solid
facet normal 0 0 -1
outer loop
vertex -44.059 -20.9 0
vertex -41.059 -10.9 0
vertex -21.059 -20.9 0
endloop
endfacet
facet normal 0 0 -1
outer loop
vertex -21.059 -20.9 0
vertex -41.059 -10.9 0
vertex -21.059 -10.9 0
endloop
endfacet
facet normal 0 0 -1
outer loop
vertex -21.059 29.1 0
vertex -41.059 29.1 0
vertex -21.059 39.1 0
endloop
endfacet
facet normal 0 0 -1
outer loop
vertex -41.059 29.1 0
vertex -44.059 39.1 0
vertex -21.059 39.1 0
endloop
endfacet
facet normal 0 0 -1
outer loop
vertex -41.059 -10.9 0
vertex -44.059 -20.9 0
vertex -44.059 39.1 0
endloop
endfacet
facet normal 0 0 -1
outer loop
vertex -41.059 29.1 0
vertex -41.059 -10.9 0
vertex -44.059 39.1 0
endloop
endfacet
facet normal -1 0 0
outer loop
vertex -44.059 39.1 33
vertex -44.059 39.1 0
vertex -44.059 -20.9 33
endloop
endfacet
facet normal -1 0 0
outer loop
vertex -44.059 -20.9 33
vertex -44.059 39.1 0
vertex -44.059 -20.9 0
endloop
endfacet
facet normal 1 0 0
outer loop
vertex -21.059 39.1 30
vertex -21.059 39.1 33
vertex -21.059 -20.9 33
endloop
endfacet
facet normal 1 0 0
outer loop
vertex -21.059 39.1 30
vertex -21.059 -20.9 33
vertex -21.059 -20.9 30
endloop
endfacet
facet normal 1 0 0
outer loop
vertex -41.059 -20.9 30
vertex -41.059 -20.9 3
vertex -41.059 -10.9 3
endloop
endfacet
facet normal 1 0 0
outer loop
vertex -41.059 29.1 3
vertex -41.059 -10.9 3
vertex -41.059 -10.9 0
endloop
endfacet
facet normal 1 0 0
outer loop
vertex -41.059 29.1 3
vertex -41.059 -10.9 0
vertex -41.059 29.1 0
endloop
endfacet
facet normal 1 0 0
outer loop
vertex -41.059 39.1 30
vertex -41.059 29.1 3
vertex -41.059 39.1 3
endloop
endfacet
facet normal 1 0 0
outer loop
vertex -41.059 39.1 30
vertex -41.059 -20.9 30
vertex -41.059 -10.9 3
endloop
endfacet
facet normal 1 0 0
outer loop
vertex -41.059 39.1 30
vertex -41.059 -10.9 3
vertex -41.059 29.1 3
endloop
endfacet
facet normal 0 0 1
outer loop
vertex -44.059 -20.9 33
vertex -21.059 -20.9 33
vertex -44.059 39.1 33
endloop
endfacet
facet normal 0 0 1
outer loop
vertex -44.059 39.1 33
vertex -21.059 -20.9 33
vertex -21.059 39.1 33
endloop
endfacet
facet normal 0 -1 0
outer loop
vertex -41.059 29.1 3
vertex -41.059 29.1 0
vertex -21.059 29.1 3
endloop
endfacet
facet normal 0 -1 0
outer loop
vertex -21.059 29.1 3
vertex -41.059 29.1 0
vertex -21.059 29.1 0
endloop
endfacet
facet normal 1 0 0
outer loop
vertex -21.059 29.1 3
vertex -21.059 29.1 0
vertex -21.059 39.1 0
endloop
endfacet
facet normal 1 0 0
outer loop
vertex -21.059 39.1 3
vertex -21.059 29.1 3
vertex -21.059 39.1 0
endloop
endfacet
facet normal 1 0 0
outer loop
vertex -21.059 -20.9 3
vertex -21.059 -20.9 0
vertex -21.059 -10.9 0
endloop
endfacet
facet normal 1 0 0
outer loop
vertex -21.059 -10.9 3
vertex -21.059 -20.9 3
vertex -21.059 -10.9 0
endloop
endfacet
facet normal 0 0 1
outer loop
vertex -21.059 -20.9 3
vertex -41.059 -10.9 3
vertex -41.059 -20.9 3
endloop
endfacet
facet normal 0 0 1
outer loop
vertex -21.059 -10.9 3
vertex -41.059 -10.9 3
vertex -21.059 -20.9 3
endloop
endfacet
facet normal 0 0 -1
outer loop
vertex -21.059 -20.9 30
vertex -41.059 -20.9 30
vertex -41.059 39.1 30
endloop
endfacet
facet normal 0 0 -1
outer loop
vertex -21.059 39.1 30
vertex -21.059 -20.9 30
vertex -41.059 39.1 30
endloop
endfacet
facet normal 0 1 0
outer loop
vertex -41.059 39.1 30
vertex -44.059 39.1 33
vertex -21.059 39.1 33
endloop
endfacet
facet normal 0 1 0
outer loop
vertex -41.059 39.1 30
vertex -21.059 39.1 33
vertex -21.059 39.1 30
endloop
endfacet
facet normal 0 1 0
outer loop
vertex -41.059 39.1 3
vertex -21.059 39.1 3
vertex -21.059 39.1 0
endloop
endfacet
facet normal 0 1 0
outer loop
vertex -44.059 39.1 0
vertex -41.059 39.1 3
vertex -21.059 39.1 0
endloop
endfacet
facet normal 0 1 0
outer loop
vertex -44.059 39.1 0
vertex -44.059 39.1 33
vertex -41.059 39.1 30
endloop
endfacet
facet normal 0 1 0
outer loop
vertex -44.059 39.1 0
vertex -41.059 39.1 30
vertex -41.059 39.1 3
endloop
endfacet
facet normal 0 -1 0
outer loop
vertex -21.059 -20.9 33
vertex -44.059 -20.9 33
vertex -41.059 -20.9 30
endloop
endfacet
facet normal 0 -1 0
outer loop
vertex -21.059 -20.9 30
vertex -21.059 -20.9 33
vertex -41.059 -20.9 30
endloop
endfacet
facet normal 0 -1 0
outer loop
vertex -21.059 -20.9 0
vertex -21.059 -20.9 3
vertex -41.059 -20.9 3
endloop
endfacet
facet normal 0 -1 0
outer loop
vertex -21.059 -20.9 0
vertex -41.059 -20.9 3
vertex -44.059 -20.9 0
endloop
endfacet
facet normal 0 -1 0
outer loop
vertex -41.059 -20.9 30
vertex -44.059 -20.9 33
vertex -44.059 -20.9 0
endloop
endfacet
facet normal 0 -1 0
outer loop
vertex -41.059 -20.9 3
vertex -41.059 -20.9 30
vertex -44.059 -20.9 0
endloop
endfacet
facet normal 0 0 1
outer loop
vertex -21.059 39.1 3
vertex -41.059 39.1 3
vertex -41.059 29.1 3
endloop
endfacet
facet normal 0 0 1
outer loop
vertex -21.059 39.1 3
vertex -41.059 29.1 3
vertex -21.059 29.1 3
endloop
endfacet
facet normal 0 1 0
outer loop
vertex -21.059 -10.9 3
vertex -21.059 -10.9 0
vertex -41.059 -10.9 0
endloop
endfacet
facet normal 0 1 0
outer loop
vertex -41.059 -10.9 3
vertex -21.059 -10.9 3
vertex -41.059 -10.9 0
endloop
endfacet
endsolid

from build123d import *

# Parameters (mm, degrees)
BOSS_EXTRU_1_DEPTH      = 36
ESQUISSE2_W             = 20
ESQUISSE2_H             = 10
ENL_V_MAT_EXTRU_1_DEPTH = 33
ESQUISSE3_W             = 20
ESQUISSE3_H             = 10
ENL_V_MAT_EXTRU_2_DEPTH = 33
ESQUISSE5_W             = 6
ESQUISSE5_H             = 60
BOSS_EXTRU_3_DEPTH      = 20
ESQUISSE6_W             = 3
ESQUISSE6_H             = 60
ENL_V_MAT_EXTRU_3_DEPTH = 50


with BuildPart() as part:
    # Esquisse1 → Boss.-Extru.1 (new body)
    with BuildSketch(Plane.XY):
        Polygon((-21.058577834, 39.100001216), (-44.058577834, 39.100001216), (-44.058577834, -20.899998784), (-21.058577834, -20.899998784), (-21.058577834, -10.899998784), (-41.058577834, -10.899998784), (-41.058577834, 29.100001216), (-21.058577834, 29.100001216), align=None)
    extrude(amount=BOSS_EXTRU_1_DEPTH)

    # Esquisse2 → Enlèv. mat.-Extru.1 (cut)
    with BuildSketch(Plane.XY.offset(36)):
        with Locations((-31.058577834, 34.100001216)):
            Rectangle(ESQUISSE2_W, ESQUISSE2_H)
    extrude(amount=-ENL_V_MAT_EXTRU_1_DEPTH, mode=Mode.SUBTRACT)

    # Esquisse3 → Enlèv. mat.-Extru.2 (cut)
    with BuildSketch(Plane.XY.offset(36)):
        with Locations((-31.058577834, -15.899998784)):
            Rectangle(ESQUISSE3_W, ESQUISSE3_H)
    extrude(amount=-ENL_V_MAT_EXTRU_2_DEPTH, mode=Mode.SUBTRACT)

    # Esquisse5 → Boss.-Extru.3 (add)
    with BuildSketch(Plane(origin=(-41.058577834, 0, 0), x_dir=(0, 0, -1), z_dir=(1, 0, 0))):
        with Locations((-33, 9.100001216)):
            Rectangle(ESQUISSE5_W, ESQUISSE5_H)
    extrude(amount=BOSS_EXTRU_3_DEPTH)

    # Esquisse6 → Enlèv. mat.-Extru.3 (cut)
    with BuildSketch(Plane(origin=(-21.058577834, 0, 0), x_dir=(0, 0, -1), z_dir=(1, 0, 0))):
        with Locations((-34.5, 9.100001216)):
            Rectangle(ESQUISSE6_W, ESQUISSE6_H)
    extrude(amount=-ENL_V_MAT_EXTRU_3_DEPTH, mode=Mode.SUBTRACT)


solid = part.part
